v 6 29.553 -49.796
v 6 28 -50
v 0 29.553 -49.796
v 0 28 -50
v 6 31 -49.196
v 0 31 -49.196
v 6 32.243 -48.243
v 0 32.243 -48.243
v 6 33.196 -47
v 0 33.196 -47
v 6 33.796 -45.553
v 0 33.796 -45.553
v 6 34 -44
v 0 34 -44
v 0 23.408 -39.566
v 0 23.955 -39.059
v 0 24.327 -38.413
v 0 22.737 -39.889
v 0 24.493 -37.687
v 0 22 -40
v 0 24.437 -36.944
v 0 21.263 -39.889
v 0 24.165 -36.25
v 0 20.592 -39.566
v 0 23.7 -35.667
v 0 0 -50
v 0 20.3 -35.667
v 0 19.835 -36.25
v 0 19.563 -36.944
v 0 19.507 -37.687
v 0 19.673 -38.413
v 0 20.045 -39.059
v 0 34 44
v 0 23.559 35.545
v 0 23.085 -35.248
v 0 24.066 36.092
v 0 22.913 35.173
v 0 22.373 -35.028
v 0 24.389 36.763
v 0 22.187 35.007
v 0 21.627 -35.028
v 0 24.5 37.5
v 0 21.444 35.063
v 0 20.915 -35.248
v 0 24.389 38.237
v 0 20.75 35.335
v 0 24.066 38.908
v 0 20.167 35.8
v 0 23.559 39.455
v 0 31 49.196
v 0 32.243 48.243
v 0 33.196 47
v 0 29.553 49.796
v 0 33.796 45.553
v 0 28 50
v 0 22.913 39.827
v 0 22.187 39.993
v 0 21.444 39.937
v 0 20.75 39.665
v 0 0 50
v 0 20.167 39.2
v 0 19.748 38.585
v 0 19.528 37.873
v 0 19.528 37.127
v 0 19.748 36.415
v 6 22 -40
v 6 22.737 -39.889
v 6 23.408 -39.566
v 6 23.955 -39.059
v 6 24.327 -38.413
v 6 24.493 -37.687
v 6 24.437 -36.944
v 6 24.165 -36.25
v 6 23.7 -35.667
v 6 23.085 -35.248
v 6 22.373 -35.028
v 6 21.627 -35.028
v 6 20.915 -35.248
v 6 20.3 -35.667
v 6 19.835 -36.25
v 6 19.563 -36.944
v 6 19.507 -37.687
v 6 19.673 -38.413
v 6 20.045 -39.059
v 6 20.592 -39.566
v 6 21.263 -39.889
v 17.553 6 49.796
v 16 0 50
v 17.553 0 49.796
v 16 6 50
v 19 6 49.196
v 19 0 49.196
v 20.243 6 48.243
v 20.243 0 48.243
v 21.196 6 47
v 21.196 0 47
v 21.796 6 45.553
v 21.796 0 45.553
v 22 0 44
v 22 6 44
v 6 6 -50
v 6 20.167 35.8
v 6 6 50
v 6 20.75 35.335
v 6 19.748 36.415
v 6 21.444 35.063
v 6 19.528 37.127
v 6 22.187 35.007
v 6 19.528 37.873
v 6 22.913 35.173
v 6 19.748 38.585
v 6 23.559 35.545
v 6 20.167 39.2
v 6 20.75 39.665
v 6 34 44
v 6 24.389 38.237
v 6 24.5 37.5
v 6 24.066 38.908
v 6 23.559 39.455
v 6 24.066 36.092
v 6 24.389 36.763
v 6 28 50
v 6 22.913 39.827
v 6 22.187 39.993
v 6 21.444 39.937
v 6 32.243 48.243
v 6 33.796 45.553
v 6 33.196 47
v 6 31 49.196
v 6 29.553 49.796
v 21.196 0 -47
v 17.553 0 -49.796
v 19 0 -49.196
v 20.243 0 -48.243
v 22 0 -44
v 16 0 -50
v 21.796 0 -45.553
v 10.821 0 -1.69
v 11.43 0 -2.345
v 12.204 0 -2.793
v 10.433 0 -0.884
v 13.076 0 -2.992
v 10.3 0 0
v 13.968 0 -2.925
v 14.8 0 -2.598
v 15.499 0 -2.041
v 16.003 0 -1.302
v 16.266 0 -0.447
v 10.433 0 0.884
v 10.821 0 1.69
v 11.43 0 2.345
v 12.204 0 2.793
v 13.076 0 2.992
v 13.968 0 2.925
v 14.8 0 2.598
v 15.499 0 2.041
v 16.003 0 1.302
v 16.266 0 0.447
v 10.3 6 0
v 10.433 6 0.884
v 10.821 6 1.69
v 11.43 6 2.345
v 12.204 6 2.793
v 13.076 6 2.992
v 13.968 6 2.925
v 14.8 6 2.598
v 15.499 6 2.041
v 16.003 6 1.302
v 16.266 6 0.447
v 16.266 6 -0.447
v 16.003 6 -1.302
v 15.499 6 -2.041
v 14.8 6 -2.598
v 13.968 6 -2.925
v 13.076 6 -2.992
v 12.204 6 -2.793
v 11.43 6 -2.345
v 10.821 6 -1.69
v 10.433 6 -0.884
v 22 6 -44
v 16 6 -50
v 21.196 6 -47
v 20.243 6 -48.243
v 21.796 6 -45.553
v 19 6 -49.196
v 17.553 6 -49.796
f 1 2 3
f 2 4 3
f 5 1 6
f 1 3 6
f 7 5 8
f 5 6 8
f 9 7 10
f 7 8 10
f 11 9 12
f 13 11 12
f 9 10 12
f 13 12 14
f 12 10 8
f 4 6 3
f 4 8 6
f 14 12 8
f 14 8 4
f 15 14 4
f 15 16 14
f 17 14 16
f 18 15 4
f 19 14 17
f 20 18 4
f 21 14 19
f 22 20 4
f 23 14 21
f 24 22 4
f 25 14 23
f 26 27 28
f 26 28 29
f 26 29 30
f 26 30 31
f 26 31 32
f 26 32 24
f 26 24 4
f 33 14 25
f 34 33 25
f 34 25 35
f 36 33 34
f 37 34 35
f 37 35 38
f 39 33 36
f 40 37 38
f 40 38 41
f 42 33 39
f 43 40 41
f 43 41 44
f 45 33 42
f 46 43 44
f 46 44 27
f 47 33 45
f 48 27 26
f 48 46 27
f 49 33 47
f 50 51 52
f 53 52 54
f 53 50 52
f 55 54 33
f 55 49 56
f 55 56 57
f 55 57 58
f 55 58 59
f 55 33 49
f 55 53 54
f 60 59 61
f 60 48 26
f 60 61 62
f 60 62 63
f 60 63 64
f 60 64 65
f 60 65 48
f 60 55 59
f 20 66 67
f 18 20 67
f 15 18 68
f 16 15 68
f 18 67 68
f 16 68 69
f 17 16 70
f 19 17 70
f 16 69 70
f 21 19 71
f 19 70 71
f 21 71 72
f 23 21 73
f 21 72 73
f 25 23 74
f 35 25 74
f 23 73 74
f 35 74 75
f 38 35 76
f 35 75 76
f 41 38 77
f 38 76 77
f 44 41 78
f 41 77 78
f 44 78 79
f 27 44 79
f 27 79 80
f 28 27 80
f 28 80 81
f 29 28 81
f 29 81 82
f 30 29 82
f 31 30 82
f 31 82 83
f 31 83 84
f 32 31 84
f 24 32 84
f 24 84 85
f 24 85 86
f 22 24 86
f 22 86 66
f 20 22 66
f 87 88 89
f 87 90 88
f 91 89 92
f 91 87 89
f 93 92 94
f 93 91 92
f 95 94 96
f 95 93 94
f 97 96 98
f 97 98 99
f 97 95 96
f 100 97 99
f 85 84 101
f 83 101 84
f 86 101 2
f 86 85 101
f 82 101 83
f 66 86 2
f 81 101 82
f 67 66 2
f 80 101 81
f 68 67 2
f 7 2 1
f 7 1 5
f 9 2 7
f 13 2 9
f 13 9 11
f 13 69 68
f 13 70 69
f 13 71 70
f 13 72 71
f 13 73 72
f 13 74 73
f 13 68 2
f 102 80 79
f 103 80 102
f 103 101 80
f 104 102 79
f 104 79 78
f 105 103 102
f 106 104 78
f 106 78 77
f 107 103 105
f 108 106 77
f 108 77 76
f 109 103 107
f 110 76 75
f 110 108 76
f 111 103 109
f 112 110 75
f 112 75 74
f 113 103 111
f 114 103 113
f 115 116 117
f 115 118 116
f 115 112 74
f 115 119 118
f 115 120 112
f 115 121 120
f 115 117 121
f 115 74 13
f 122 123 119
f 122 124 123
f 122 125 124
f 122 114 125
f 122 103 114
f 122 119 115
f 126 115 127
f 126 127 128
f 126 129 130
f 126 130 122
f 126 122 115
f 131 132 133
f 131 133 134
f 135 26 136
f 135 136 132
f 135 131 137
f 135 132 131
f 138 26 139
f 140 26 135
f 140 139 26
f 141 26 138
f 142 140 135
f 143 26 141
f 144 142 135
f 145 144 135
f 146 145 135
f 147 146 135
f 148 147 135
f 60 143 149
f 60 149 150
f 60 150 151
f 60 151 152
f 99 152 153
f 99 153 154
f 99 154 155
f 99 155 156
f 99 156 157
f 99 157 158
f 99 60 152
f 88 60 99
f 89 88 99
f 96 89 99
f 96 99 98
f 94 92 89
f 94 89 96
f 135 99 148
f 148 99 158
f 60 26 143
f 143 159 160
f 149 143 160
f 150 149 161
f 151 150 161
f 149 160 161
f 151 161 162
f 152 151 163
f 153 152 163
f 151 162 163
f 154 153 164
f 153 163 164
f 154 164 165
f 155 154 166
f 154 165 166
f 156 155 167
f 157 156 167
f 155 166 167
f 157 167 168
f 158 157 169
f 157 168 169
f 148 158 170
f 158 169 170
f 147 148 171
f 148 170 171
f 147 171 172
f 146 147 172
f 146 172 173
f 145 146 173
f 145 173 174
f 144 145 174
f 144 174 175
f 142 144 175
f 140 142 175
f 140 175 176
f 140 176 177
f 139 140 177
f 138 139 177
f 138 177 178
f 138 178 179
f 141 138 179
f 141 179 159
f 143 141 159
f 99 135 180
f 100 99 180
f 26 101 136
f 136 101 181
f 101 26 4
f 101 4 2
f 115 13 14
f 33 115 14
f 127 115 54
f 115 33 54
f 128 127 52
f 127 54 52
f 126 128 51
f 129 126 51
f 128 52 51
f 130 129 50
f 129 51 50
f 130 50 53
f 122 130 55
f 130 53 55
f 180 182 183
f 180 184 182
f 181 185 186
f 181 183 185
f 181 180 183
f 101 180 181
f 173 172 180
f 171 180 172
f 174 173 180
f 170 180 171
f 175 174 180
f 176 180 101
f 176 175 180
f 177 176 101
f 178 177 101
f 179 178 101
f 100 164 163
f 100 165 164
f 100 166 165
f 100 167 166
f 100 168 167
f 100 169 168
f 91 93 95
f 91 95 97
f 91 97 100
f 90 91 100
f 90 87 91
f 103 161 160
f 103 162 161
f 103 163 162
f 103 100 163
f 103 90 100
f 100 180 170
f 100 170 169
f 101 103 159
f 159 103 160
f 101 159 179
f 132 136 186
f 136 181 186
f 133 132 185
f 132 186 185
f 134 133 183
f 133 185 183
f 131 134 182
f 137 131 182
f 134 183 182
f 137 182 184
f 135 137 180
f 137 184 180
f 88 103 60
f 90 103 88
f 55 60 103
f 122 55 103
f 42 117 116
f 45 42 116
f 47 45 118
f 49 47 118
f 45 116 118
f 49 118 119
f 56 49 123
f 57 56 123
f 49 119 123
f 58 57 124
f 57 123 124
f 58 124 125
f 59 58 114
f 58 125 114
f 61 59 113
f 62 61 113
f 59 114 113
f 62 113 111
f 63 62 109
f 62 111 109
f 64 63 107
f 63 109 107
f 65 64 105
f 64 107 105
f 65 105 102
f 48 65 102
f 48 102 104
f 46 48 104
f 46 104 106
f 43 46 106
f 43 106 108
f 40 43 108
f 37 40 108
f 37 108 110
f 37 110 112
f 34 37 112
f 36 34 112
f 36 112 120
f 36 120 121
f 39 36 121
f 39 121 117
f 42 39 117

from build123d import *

# Parameters (mm, degrees)
BOSS_EXTRUDE1_DEPTH = 50
CUT_EXTRUDE1_REACH  = 64.546
SKETCH2_R           = 2.5
CUT_EXTRUDE2_REACH  = 63.384
SKETCH3_R           = 3
FILLET1_R           = 6


with BuildPart() as part:
    # Sketch1 → Boss-Extrude1 (new, symmetric)
    with BuildSketch(Plane.XY):
        Polygon((0, 34), (0, 0), (22, 0), (22, 6), (6, 6), (6, 34), align=None)
    extrude(amount=BOSS_EXTRUDE1_DEPTH, both=True)

    # Sketch2 → Cut-Extrude1 (cut, up to next)
    with BuildSketch(Plane(origin=(6, 0, 0), x_dir=(0, 0, -1), z_dir=(1, 0, 0)), mode=Mode.PRIVATE) as cut_extrude1_sk1:
        with Locations(Location((-37.5, 22, 0), (0, 0, 90))):
            Circle(SKETCH2_R)
    cut_extrude1_tool1 = extrude(cut_extrude1_sk1.sketch, amount=-CUT_EXTRUDE1_REACH, mode=Mode.PRIVATE) & part.part
    # Sketch2 → Cut-Extrude1 (cut, up to next)
    with BuildSketch(Plane(origin=(6, 0, 0), x_dir=(0, 0, -1), z_dir=(1, 0, 0)), mode=Mode.PRIVATE) as cut_extrude1_sk2:
        with Locations((37.5, 22)):
            Circle(SKETCH2_R)
    cut_extrude1_tool2 = extrude(cut_extrude1_sk2.sketch, amount=-CUT_EXTRUDE1_REACH, mode=Mode.PRIVATE) & part.part
    add(cut_extrude1_tool1.solids().sort_by_distance((6, 22, 37.5))[0], mode=Mode.SUBTRACT)
    add(cut_extrude1_tool2.solids().sort_by_distance((6, 22, -37.5))[0], mode=Mode.SUBTRACT)

    # Sketch3 → Cut-Extrude2 (cut, up to next)
    with BuildSketch(Plane(origin=(0, 6, 0), x_dir=(1, 0, 0), z_dir=(0, 1, 0)), mode=Mode.PRIVATE) as cut_extrude2_sk1:
        with Locations(Location((13.3, 0, 0), (0, 0, 180))):
            Circle(SKETCH3_R)
    cut_extrude2_tool1 = extrude(cut_extrude2_sk1.sketch, amount=-CUT_EXTRUDE2_REACH, mode=Mode.PRIVATE) & part.part
    add(cut_extrude2_tool1.solids().sort_by_distance((13.3, 6, 0))[0], mode=Mode.SUBTRACT)

    # Fillet1
    fillet1_edges = [part.edges().sort_by_distance(p)[0] for p in [
        (22, 3, 50),
        (3, 34, 50),
        (22, 3, -50),
        (3, 34, -50),
    ]]
    fillet(fillet1_edges, radius=FILLET1_R)


solid = part.part
